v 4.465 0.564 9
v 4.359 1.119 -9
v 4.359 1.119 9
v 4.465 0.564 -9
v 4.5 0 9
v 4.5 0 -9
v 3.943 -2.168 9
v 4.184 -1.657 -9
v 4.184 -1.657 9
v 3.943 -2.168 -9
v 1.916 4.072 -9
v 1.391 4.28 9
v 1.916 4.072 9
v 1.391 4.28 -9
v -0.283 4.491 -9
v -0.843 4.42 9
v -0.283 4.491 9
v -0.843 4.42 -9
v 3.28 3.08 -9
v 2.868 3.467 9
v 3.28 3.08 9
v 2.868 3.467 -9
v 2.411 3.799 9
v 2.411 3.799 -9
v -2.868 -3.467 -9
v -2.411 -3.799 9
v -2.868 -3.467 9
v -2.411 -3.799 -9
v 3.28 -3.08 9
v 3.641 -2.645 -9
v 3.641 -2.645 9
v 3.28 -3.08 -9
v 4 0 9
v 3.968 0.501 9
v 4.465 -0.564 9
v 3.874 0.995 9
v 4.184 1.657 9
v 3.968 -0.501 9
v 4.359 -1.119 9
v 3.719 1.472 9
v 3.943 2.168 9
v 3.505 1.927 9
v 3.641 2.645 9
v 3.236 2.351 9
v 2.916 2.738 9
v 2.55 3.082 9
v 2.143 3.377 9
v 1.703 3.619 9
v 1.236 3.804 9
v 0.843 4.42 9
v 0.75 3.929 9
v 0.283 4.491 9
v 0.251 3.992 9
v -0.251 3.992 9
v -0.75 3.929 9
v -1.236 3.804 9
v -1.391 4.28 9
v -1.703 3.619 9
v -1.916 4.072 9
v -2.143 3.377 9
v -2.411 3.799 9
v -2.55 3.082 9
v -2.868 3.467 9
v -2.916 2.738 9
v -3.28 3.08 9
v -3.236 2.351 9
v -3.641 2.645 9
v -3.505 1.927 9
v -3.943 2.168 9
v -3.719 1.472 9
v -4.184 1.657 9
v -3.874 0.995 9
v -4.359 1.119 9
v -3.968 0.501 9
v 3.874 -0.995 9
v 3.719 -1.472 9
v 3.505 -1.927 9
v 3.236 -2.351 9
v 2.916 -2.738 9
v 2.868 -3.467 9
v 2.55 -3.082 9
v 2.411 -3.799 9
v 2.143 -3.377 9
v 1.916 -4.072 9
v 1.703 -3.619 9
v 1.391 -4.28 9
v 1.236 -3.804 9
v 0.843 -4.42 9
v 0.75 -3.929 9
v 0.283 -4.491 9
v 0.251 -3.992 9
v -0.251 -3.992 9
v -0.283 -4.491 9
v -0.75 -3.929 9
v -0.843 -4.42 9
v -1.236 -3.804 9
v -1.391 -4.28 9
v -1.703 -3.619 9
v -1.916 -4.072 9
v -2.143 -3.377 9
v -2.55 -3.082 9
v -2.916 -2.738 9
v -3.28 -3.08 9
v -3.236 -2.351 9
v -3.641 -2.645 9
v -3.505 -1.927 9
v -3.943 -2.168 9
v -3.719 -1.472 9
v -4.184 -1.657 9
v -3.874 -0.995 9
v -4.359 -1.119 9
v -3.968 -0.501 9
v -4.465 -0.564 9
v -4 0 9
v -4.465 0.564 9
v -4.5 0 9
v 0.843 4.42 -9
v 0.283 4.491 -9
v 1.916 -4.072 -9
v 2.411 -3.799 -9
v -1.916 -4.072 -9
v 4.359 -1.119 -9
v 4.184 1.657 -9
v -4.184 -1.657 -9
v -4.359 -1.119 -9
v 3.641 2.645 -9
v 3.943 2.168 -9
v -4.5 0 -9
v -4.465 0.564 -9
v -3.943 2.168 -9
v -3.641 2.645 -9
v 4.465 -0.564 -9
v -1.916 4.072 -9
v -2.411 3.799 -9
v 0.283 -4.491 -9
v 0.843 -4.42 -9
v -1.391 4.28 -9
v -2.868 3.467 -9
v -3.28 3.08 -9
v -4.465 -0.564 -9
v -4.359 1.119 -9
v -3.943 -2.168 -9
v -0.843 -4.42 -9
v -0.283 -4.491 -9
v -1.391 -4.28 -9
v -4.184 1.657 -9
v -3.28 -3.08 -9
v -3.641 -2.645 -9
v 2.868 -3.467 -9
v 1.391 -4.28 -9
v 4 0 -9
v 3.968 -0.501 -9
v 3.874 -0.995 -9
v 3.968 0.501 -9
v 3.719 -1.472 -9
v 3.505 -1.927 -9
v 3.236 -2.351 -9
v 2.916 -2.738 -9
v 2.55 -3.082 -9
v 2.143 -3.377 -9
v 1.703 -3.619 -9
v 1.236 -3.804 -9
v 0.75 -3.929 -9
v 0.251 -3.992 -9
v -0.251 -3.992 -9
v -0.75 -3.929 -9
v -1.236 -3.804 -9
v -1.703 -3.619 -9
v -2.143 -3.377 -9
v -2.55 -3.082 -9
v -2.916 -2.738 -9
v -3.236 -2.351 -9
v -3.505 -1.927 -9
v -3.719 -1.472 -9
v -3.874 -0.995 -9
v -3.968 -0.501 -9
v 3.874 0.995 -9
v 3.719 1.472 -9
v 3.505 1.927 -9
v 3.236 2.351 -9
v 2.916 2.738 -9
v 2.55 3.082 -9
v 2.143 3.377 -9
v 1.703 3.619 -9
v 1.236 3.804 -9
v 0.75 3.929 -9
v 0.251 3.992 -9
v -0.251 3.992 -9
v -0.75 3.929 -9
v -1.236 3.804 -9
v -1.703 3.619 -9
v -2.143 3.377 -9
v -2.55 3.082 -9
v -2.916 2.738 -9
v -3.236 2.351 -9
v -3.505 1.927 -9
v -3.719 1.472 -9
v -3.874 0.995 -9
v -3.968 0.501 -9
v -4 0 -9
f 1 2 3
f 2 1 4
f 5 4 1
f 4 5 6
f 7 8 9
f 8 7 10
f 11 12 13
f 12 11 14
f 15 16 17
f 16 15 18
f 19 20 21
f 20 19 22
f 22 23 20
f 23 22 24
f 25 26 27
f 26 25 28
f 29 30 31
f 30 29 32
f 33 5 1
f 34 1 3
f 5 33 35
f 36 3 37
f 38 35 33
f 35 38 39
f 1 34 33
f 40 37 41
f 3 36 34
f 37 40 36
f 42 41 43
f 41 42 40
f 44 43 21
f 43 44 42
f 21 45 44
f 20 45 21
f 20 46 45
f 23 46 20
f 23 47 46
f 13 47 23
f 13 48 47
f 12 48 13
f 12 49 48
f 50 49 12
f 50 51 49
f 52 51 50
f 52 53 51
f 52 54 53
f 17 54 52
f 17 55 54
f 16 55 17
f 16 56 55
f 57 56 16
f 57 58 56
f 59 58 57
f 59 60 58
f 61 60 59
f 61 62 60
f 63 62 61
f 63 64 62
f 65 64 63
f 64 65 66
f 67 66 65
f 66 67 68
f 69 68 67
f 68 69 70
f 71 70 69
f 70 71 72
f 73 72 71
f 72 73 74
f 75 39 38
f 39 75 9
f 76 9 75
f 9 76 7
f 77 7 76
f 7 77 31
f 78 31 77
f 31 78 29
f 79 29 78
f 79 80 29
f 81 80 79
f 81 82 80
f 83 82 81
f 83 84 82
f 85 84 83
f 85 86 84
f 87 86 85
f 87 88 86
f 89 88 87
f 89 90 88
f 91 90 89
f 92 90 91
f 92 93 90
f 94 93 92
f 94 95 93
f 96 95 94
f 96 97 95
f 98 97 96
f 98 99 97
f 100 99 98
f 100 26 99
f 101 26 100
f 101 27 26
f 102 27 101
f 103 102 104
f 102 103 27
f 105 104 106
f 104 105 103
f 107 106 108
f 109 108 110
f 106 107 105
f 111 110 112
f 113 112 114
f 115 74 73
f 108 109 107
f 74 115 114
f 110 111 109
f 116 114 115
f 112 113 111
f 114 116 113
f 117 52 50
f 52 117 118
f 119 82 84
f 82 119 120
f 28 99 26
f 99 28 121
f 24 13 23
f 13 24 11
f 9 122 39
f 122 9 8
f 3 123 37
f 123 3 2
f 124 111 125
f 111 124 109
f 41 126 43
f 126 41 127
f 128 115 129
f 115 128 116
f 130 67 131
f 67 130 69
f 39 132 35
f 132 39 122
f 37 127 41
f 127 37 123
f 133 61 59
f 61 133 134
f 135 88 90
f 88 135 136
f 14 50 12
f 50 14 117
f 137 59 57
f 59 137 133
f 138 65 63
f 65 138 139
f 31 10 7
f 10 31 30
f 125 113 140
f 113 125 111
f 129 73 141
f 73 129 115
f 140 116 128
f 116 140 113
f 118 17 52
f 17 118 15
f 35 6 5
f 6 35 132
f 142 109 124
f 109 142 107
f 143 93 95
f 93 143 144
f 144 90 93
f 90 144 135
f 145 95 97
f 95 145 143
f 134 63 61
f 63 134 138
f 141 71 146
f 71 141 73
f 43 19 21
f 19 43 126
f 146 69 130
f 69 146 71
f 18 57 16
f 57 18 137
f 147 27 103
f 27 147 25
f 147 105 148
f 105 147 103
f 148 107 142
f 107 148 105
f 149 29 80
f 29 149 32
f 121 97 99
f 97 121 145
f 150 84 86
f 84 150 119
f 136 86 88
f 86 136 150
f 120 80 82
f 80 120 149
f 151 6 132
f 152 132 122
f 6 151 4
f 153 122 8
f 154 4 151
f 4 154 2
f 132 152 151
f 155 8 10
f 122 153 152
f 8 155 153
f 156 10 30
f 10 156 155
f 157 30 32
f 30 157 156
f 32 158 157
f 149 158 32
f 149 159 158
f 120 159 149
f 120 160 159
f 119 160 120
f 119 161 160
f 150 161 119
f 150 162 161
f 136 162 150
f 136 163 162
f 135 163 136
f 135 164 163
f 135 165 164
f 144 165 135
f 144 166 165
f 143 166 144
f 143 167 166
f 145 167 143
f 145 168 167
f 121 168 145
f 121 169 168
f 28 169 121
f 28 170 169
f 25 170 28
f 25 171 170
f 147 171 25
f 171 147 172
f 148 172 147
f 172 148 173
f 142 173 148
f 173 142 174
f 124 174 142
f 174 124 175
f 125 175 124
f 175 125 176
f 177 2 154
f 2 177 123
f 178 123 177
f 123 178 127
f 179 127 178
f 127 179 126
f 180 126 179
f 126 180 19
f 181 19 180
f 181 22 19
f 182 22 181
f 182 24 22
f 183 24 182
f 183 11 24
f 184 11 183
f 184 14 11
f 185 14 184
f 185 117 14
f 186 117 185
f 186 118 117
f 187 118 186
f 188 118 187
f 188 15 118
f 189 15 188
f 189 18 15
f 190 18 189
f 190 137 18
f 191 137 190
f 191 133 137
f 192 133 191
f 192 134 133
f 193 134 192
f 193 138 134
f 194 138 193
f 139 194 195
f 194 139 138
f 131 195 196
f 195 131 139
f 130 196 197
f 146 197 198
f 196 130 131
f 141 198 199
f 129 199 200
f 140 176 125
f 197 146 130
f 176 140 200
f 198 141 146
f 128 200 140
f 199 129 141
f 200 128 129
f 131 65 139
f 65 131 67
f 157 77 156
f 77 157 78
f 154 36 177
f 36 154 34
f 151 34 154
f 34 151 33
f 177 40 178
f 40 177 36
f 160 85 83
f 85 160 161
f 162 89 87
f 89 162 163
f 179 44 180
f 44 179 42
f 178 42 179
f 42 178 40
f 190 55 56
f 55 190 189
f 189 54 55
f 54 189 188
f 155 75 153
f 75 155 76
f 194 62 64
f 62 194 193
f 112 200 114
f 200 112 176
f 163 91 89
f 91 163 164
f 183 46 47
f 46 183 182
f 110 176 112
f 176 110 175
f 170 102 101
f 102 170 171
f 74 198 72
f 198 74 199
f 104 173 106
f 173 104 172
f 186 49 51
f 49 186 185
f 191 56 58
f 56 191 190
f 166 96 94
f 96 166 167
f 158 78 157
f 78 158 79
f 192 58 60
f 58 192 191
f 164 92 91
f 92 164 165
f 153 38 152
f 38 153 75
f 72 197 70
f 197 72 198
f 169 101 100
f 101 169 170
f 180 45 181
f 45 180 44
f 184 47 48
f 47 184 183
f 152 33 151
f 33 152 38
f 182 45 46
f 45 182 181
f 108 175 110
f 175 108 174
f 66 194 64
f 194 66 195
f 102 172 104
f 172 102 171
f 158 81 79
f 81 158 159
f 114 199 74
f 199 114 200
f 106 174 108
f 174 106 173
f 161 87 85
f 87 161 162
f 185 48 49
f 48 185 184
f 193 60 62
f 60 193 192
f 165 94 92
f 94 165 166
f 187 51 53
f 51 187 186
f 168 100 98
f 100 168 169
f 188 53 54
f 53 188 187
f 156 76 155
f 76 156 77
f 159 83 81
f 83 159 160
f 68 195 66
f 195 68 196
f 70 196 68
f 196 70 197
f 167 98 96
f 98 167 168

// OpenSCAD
$fn = 50;


difference() {
	union() {
		translate(v = [0, 0, -9.0000000000]) {
			cylinder(h = 18, r = 4.5000000000);
		}
	}
	union() {
		translate(v = [0, 0, -100.0000000000]) {
			cylinder(h = 200, r = 4.0000000000);
		}
	}
}
